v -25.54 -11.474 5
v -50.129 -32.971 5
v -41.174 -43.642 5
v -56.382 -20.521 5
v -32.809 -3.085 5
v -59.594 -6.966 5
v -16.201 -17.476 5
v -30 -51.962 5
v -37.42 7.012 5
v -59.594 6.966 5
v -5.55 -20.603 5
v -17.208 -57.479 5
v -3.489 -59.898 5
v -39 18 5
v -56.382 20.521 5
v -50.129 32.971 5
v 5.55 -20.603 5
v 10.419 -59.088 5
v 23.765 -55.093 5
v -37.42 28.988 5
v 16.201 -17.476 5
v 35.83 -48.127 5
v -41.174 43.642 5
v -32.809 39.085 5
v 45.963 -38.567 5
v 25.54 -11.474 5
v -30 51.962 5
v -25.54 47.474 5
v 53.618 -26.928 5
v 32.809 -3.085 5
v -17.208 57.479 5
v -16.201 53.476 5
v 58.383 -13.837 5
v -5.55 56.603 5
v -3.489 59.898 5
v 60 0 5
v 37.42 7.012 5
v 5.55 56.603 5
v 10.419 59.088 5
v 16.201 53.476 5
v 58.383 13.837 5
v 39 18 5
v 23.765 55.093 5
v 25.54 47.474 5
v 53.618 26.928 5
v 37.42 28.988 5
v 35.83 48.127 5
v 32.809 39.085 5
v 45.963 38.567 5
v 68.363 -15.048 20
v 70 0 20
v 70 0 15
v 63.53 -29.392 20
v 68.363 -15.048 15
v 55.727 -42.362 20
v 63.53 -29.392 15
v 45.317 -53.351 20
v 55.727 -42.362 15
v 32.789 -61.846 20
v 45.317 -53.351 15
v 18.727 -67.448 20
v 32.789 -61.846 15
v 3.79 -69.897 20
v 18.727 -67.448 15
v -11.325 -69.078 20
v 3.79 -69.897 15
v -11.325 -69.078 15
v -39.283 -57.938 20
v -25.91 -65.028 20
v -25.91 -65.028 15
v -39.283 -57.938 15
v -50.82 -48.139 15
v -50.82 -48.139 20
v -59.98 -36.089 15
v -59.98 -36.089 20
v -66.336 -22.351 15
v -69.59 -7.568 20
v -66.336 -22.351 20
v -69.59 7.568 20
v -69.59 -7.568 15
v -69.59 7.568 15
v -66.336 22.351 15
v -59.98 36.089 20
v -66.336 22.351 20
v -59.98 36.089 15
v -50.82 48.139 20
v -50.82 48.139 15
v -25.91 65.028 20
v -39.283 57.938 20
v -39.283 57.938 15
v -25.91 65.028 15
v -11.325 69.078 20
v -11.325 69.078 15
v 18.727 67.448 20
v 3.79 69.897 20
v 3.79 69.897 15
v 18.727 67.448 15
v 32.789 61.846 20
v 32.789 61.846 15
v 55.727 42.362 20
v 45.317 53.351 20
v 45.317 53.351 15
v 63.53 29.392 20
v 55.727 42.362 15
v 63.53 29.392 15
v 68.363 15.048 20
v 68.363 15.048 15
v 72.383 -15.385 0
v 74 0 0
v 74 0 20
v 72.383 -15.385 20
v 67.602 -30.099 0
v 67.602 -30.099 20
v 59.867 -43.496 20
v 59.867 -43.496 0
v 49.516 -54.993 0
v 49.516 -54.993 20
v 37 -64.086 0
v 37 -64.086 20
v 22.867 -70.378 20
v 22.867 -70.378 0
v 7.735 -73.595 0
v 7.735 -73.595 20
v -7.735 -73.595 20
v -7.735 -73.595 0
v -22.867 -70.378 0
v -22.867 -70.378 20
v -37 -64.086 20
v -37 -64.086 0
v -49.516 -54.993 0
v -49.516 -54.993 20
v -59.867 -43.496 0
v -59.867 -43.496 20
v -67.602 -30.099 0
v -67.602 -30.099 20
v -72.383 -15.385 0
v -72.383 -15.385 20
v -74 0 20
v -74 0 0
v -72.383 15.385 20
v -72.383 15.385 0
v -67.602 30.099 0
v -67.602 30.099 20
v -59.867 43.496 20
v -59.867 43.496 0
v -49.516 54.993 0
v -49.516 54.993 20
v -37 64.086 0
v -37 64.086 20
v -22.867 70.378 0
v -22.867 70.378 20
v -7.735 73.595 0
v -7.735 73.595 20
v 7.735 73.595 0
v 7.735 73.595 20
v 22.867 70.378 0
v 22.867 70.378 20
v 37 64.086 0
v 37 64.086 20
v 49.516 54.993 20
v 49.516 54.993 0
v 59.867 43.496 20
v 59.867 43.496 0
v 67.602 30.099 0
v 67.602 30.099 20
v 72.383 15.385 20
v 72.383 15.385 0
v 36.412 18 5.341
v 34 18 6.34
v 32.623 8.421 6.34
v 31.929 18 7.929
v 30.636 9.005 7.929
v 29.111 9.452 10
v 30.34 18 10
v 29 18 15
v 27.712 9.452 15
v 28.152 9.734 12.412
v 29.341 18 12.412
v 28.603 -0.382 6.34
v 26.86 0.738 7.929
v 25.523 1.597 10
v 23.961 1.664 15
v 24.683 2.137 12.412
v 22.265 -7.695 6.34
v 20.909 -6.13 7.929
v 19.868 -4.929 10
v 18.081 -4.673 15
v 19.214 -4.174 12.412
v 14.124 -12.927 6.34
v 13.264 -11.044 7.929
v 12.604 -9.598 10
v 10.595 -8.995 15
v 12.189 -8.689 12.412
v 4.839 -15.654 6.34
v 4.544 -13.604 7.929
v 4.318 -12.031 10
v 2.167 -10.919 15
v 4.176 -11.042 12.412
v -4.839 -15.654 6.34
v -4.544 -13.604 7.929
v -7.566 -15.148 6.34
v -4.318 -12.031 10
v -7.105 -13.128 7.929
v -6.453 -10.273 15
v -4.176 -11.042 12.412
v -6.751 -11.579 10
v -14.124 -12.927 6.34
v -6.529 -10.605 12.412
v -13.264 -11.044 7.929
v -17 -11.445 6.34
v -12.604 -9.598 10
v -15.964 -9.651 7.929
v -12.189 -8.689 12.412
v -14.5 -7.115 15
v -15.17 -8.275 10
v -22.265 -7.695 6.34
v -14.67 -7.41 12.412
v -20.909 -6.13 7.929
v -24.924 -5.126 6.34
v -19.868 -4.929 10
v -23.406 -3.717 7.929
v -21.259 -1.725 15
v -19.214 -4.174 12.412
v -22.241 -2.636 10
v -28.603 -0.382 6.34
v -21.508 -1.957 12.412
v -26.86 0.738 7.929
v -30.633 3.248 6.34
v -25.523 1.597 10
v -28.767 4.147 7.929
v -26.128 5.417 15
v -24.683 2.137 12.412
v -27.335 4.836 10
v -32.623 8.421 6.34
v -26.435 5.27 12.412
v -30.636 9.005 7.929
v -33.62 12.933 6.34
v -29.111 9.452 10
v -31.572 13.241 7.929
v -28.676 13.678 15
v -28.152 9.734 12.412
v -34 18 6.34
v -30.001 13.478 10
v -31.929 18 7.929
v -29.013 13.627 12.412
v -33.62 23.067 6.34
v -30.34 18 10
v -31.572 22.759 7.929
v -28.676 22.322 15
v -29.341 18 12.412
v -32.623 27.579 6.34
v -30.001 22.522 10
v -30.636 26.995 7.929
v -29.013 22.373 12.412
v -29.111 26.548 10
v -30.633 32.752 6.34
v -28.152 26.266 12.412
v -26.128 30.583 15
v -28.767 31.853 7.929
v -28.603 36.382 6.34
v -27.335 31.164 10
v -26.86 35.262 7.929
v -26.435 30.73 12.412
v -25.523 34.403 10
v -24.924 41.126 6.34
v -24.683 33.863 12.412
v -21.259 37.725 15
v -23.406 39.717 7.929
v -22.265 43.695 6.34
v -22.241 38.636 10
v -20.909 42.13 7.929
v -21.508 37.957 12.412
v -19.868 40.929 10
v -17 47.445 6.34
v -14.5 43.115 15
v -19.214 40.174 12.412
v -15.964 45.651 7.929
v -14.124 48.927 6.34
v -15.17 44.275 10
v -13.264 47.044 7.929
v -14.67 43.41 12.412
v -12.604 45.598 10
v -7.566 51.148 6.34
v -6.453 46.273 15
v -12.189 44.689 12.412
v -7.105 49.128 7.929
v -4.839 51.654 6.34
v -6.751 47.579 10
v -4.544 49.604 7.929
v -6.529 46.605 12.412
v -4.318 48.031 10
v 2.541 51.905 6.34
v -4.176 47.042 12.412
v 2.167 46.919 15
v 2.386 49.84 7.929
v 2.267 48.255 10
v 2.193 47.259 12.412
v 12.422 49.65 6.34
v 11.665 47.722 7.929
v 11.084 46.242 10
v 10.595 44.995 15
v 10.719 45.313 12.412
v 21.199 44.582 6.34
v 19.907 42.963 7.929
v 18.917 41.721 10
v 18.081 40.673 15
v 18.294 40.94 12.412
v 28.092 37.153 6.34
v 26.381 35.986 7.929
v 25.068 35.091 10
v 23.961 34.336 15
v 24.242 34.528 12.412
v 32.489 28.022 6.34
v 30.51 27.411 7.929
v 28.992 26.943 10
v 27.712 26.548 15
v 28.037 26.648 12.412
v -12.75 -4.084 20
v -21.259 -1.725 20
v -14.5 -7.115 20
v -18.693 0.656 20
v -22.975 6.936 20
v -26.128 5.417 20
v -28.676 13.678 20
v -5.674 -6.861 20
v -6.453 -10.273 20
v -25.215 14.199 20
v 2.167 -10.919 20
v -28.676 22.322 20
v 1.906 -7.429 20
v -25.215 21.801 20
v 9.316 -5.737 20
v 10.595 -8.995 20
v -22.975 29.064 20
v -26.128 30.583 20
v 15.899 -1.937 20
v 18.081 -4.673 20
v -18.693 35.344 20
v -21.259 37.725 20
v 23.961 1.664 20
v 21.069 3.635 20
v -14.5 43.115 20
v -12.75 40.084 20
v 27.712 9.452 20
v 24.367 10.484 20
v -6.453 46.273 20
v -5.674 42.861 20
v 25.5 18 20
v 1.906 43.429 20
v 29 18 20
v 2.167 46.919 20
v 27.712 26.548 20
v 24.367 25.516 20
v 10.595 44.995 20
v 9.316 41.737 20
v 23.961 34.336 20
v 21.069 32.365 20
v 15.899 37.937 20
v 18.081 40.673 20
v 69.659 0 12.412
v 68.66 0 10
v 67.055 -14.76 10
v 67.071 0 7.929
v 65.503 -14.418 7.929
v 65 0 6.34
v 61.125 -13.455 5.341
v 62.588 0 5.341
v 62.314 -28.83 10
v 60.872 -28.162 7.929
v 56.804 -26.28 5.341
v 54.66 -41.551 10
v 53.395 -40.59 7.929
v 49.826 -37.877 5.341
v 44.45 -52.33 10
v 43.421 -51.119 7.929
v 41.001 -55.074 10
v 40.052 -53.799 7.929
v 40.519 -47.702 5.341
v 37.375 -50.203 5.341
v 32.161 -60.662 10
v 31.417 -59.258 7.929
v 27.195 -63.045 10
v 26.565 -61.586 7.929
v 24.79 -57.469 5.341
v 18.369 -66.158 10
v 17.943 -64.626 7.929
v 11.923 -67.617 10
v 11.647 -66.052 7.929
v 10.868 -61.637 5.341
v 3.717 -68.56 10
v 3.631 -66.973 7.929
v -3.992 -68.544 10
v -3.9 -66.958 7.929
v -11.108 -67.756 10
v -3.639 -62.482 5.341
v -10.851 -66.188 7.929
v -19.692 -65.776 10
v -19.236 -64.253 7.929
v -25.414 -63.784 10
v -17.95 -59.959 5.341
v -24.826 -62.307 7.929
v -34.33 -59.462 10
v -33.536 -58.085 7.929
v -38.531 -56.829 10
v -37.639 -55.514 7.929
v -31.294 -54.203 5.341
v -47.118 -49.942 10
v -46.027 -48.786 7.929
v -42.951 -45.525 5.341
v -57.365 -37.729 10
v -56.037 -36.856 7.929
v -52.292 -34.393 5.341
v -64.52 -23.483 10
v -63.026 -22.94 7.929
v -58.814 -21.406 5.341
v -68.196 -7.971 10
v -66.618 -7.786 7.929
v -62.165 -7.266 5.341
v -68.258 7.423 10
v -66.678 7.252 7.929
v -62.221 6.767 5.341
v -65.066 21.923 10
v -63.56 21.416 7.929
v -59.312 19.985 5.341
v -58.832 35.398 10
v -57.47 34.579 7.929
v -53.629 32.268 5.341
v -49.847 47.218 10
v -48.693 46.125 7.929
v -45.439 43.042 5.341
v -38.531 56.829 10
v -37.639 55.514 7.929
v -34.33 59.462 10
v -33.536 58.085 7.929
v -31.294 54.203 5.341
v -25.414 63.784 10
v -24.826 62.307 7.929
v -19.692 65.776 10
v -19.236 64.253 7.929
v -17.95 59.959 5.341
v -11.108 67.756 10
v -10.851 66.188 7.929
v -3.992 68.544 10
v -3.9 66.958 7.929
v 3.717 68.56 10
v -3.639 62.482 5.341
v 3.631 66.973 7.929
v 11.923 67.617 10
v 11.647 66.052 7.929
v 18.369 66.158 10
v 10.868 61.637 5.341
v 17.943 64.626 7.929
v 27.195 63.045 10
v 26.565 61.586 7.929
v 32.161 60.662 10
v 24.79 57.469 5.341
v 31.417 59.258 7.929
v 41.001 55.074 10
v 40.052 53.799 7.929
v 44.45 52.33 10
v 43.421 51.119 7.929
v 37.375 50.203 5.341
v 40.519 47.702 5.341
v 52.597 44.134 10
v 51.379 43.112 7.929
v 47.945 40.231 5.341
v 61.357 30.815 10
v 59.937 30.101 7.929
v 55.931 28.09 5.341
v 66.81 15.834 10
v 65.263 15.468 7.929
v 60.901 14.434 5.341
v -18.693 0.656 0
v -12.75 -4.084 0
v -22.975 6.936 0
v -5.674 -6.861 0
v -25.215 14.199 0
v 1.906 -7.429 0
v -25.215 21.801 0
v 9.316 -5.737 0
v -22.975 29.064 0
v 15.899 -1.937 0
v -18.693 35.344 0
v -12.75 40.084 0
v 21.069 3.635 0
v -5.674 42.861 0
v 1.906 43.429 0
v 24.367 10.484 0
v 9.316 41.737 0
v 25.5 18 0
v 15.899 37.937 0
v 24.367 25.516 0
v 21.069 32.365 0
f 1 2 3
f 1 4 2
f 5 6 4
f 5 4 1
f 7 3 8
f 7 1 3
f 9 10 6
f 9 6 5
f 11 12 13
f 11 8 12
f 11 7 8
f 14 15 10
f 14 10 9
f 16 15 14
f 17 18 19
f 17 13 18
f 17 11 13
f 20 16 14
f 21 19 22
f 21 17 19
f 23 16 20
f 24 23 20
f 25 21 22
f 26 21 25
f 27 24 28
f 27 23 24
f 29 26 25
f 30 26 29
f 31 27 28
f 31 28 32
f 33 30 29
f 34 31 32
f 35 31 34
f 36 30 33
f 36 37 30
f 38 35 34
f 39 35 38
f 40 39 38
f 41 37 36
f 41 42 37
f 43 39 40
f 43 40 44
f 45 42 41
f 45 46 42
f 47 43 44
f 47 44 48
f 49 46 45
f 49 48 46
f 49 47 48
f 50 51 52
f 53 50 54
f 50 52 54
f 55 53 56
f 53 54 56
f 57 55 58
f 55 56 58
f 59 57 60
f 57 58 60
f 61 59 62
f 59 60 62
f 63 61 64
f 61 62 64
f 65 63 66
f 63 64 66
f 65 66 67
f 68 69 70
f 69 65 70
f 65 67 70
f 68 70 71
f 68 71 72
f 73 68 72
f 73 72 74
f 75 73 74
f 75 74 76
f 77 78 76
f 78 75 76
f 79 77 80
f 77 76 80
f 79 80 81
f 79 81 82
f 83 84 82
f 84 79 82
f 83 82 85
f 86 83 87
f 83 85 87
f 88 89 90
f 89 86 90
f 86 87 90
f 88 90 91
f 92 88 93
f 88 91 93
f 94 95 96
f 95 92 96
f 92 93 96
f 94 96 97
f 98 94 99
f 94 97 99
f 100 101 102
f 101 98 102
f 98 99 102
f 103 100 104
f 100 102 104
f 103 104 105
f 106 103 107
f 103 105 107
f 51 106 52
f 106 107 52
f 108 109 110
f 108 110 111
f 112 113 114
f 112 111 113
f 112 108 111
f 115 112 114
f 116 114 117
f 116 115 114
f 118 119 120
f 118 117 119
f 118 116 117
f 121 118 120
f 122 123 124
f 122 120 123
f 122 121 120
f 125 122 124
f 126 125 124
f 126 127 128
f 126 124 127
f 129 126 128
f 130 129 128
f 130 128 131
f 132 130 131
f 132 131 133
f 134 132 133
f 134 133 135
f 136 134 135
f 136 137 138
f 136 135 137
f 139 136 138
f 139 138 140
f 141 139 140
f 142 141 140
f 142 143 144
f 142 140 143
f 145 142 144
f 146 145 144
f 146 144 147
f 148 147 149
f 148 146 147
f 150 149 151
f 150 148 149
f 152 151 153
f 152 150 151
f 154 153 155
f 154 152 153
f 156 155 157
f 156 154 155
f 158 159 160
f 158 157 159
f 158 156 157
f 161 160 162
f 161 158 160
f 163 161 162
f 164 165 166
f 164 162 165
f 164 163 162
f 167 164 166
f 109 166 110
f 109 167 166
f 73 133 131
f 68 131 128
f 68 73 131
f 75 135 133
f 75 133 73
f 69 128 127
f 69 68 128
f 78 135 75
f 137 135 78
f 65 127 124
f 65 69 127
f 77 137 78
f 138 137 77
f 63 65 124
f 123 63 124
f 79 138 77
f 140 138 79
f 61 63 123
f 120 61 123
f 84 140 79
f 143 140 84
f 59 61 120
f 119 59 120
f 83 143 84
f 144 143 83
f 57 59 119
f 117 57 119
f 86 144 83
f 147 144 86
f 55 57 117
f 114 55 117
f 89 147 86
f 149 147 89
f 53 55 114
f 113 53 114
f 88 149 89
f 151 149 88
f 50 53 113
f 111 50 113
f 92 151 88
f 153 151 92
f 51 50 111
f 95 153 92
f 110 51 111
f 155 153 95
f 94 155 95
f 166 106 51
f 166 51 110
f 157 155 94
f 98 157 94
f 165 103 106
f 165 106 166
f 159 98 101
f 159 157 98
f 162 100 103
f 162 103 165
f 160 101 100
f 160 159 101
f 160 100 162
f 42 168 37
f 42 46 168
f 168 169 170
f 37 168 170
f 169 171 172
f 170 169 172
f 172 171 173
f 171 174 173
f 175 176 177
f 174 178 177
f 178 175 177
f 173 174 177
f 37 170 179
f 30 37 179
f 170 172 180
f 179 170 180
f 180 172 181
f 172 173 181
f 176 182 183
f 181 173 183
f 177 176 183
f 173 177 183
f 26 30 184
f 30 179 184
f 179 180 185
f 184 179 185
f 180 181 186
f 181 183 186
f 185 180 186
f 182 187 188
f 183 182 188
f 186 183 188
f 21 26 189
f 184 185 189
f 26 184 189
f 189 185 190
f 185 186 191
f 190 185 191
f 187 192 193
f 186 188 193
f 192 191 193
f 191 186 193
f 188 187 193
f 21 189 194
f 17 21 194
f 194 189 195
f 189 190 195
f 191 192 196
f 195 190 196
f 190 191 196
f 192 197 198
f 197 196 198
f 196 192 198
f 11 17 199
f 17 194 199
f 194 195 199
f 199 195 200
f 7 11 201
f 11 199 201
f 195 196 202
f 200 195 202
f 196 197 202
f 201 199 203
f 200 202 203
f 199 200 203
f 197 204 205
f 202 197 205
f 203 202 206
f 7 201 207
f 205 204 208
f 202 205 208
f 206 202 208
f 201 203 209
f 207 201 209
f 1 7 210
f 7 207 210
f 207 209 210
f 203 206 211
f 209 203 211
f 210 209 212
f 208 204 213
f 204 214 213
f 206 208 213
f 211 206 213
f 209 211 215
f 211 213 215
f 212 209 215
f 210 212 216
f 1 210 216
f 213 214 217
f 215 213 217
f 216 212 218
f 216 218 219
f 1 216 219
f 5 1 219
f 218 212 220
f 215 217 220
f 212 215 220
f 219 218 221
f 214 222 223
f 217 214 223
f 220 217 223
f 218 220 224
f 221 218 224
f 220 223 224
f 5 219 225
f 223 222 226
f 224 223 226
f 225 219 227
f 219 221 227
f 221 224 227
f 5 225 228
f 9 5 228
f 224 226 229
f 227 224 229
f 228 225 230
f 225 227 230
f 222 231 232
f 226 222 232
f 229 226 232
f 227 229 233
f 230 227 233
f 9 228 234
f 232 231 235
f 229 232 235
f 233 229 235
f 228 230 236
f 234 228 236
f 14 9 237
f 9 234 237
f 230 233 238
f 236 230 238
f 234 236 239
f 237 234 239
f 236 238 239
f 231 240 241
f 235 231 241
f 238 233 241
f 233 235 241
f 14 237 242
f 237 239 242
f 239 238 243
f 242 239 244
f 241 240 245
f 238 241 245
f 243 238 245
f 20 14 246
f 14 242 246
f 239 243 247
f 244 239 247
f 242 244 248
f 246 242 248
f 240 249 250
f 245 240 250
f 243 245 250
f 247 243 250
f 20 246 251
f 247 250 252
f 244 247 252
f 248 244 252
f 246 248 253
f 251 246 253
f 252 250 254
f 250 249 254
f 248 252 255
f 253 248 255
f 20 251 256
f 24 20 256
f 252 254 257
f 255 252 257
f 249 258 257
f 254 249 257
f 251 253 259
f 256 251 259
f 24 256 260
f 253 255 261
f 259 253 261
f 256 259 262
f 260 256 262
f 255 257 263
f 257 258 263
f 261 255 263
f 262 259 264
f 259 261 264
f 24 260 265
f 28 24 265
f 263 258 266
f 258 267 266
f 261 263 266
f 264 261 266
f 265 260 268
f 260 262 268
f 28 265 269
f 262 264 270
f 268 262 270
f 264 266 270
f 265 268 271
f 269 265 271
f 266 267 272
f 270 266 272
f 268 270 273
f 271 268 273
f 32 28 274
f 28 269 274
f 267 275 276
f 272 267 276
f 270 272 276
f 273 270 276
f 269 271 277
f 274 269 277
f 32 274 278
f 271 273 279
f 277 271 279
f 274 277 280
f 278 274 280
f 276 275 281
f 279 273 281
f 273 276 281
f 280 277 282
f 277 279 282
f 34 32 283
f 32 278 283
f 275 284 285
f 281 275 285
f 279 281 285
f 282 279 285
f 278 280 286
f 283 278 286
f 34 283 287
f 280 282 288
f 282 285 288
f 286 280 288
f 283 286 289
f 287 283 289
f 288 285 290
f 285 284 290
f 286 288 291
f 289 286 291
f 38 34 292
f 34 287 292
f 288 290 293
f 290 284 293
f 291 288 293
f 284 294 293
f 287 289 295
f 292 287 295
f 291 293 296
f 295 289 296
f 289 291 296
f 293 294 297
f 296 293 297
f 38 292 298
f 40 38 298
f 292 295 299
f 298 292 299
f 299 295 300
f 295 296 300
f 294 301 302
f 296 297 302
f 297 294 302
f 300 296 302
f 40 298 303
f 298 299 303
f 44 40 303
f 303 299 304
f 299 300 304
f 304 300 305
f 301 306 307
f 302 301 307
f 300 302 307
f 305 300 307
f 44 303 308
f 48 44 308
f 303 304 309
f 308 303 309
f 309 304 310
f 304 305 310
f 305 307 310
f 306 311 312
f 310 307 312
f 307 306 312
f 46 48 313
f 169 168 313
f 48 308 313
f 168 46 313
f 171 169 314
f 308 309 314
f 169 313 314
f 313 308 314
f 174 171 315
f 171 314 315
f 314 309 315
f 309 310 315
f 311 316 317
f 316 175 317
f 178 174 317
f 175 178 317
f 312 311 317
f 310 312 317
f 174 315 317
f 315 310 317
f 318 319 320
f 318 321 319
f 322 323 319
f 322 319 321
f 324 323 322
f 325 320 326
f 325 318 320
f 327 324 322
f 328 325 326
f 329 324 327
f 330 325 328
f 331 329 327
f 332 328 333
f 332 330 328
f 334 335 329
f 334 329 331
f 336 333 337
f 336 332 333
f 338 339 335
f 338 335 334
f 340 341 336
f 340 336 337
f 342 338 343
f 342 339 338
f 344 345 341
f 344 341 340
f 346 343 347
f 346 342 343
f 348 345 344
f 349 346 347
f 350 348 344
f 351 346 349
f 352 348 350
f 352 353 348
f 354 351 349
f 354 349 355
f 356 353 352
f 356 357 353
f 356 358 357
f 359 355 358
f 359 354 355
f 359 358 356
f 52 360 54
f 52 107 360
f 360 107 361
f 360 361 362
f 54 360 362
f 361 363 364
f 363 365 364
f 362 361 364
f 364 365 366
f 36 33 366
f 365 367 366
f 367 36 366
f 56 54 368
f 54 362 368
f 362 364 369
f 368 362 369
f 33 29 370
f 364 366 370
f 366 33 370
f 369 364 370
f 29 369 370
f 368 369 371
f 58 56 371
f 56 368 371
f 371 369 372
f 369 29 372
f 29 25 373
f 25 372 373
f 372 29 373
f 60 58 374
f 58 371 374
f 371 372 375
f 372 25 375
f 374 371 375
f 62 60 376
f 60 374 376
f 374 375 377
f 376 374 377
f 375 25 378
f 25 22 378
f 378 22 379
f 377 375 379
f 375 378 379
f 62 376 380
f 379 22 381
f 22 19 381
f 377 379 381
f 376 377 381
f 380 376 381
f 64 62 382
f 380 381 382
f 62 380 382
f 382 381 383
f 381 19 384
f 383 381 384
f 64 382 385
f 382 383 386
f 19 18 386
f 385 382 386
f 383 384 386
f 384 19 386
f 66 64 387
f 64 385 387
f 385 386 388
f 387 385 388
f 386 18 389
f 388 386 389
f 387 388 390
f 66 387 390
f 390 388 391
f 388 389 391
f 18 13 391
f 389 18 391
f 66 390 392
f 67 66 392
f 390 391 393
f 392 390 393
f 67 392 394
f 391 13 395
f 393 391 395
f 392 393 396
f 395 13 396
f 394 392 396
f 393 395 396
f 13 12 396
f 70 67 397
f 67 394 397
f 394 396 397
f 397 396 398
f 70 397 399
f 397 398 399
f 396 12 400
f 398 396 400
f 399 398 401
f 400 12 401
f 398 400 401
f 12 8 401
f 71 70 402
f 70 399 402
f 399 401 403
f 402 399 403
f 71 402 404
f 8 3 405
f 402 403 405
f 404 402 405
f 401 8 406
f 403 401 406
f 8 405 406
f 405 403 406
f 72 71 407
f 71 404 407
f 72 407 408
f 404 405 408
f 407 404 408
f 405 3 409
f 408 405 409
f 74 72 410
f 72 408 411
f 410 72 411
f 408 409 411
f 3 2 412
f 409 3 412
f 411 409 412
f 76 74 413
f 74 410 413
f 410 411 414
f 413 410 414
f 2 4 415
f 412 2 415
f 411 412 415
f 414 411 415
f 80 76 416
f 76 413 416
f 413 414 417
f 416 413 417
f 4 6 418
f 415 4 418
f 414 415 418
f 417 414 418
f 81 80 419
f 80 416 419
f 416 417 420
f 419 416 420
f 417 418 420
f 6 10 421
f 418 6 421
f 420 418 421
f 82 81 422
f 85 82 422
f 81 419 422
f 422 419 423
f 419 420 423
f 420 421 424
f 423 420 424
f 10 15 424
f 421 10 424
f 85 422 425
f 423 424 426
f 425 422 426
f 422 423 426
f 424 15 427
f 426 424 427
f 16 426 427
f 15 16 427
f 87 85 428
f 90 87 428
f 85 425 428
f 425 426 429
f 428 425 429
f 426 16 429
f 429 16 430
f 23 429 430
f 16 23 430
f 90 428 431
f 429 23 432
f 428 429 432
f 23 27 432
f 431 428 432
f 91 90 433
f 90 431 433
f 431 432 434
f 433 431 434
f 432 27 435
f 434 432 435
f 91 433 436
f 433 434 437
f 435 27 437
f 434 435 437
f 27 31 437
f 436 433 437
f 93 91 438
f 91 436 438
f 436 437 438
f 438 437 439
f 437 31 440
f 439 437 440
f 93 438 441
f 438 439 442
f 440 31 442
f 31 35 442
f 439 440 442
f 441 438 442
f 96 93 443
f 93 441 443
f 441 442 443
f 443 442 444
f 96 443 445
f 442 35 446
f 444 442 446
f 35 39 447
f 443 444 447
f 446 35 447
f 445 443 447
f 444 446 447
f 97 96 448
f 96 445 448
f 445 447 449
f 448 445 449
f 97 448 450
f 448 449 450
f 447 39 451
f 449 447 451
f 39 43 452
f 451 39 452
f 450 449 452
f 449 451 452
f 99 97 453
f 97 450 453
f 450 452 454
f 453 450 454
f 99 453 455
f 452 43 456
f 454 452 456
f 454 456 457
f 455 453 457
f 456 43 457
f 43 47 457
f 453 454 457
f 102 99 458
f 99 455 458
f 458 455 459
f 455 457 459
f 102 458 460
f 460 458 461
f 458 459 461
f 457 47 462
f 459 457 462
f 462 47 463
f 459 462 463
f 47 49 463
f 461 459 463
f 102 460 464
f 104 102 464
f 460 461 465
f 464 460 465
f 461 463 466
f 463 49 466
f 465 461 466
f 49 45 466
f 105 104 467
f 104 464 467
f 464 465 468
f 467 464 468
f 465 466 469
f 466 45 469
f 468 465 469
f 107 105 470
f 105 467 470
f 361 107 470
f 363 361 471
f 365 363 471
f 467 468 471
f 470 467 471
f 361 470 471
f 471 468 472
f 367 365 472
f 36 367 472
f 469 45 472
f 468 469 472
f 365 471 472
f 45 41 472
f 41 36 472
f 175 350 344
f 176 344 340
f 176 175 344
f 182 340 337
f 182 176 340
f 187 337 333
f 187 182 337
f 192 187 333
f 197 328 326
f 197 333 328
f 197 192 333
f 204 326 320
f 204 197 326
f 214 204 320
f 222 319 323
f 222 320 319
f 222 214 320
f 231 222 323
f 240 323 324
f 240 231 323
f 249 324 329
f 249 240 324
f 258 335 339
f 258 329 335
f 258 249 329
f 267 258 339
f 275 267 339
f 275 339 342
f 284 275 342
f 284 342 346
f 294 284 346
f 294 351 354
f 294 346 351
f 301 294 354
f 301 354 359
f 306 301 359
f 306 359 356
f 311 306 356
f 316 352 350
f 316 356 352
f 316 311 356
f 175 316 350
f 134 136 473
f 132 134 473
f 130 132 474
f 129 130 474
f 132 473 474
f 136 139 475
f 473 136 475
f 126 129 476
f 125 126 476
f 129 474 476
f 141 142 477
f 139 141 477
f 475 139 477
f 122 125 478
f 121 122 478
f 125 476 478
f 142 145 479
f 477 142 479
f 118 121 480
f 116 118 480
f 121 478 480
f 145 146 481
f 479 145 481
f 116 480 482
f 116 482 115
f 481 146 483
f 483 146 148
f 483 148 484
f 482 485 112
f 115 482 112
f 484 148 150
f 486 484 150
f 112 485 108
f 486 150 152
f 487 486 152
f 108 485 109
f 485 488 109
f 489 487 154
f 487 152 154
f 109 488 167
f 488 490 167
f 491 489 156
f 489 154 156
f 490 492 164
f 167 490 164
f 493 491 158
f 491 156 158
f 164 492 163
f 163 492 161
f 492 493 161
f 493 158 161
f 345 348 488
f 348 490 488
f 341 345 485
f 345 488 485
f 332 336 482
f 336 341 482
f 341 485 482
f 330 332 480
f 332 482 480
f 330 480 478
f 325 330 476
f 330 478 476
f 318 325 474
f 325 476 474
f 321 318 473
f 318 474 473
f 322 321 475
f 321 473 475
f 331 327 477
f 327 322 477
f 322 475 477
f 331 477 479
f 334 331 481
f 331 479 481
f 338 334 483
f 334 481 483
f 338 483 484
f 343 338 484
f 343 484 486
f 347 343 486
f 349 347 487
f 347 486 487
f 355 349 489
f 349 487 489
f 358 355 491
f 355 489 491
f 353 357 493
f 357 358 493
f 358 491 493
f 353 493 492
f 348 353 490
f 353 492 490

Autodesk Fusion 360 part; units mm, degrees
sketch "Sketch1" plane through (0, 0, 0) normal (0, 0, 1) x (1, 0, 0)
  circle A0 centre (0, 0) radius 74
  circle A1 centre (0, 18) radius 25.5
  circle A2 centre (0, 0) radius 70
  circle A3 centre (0, 18) radius 29
  dimension "d1" = 148
  dimension "d2" = 51
  dimension "d3" = 18
  dimension "d4" = 140
  dimension "d5" = 58
extrude "Extrude1" add sketch "Sketch1" along normal blind 5 contours A0 | A2 | A3
extrude "Extrude2" add sketch "Sketch1" along normal blind 20
fillet "Fillet1" radius 10 2 edges at (-27.0375, 28.4868, 5) (-65.2629, -25.3131, 5)
